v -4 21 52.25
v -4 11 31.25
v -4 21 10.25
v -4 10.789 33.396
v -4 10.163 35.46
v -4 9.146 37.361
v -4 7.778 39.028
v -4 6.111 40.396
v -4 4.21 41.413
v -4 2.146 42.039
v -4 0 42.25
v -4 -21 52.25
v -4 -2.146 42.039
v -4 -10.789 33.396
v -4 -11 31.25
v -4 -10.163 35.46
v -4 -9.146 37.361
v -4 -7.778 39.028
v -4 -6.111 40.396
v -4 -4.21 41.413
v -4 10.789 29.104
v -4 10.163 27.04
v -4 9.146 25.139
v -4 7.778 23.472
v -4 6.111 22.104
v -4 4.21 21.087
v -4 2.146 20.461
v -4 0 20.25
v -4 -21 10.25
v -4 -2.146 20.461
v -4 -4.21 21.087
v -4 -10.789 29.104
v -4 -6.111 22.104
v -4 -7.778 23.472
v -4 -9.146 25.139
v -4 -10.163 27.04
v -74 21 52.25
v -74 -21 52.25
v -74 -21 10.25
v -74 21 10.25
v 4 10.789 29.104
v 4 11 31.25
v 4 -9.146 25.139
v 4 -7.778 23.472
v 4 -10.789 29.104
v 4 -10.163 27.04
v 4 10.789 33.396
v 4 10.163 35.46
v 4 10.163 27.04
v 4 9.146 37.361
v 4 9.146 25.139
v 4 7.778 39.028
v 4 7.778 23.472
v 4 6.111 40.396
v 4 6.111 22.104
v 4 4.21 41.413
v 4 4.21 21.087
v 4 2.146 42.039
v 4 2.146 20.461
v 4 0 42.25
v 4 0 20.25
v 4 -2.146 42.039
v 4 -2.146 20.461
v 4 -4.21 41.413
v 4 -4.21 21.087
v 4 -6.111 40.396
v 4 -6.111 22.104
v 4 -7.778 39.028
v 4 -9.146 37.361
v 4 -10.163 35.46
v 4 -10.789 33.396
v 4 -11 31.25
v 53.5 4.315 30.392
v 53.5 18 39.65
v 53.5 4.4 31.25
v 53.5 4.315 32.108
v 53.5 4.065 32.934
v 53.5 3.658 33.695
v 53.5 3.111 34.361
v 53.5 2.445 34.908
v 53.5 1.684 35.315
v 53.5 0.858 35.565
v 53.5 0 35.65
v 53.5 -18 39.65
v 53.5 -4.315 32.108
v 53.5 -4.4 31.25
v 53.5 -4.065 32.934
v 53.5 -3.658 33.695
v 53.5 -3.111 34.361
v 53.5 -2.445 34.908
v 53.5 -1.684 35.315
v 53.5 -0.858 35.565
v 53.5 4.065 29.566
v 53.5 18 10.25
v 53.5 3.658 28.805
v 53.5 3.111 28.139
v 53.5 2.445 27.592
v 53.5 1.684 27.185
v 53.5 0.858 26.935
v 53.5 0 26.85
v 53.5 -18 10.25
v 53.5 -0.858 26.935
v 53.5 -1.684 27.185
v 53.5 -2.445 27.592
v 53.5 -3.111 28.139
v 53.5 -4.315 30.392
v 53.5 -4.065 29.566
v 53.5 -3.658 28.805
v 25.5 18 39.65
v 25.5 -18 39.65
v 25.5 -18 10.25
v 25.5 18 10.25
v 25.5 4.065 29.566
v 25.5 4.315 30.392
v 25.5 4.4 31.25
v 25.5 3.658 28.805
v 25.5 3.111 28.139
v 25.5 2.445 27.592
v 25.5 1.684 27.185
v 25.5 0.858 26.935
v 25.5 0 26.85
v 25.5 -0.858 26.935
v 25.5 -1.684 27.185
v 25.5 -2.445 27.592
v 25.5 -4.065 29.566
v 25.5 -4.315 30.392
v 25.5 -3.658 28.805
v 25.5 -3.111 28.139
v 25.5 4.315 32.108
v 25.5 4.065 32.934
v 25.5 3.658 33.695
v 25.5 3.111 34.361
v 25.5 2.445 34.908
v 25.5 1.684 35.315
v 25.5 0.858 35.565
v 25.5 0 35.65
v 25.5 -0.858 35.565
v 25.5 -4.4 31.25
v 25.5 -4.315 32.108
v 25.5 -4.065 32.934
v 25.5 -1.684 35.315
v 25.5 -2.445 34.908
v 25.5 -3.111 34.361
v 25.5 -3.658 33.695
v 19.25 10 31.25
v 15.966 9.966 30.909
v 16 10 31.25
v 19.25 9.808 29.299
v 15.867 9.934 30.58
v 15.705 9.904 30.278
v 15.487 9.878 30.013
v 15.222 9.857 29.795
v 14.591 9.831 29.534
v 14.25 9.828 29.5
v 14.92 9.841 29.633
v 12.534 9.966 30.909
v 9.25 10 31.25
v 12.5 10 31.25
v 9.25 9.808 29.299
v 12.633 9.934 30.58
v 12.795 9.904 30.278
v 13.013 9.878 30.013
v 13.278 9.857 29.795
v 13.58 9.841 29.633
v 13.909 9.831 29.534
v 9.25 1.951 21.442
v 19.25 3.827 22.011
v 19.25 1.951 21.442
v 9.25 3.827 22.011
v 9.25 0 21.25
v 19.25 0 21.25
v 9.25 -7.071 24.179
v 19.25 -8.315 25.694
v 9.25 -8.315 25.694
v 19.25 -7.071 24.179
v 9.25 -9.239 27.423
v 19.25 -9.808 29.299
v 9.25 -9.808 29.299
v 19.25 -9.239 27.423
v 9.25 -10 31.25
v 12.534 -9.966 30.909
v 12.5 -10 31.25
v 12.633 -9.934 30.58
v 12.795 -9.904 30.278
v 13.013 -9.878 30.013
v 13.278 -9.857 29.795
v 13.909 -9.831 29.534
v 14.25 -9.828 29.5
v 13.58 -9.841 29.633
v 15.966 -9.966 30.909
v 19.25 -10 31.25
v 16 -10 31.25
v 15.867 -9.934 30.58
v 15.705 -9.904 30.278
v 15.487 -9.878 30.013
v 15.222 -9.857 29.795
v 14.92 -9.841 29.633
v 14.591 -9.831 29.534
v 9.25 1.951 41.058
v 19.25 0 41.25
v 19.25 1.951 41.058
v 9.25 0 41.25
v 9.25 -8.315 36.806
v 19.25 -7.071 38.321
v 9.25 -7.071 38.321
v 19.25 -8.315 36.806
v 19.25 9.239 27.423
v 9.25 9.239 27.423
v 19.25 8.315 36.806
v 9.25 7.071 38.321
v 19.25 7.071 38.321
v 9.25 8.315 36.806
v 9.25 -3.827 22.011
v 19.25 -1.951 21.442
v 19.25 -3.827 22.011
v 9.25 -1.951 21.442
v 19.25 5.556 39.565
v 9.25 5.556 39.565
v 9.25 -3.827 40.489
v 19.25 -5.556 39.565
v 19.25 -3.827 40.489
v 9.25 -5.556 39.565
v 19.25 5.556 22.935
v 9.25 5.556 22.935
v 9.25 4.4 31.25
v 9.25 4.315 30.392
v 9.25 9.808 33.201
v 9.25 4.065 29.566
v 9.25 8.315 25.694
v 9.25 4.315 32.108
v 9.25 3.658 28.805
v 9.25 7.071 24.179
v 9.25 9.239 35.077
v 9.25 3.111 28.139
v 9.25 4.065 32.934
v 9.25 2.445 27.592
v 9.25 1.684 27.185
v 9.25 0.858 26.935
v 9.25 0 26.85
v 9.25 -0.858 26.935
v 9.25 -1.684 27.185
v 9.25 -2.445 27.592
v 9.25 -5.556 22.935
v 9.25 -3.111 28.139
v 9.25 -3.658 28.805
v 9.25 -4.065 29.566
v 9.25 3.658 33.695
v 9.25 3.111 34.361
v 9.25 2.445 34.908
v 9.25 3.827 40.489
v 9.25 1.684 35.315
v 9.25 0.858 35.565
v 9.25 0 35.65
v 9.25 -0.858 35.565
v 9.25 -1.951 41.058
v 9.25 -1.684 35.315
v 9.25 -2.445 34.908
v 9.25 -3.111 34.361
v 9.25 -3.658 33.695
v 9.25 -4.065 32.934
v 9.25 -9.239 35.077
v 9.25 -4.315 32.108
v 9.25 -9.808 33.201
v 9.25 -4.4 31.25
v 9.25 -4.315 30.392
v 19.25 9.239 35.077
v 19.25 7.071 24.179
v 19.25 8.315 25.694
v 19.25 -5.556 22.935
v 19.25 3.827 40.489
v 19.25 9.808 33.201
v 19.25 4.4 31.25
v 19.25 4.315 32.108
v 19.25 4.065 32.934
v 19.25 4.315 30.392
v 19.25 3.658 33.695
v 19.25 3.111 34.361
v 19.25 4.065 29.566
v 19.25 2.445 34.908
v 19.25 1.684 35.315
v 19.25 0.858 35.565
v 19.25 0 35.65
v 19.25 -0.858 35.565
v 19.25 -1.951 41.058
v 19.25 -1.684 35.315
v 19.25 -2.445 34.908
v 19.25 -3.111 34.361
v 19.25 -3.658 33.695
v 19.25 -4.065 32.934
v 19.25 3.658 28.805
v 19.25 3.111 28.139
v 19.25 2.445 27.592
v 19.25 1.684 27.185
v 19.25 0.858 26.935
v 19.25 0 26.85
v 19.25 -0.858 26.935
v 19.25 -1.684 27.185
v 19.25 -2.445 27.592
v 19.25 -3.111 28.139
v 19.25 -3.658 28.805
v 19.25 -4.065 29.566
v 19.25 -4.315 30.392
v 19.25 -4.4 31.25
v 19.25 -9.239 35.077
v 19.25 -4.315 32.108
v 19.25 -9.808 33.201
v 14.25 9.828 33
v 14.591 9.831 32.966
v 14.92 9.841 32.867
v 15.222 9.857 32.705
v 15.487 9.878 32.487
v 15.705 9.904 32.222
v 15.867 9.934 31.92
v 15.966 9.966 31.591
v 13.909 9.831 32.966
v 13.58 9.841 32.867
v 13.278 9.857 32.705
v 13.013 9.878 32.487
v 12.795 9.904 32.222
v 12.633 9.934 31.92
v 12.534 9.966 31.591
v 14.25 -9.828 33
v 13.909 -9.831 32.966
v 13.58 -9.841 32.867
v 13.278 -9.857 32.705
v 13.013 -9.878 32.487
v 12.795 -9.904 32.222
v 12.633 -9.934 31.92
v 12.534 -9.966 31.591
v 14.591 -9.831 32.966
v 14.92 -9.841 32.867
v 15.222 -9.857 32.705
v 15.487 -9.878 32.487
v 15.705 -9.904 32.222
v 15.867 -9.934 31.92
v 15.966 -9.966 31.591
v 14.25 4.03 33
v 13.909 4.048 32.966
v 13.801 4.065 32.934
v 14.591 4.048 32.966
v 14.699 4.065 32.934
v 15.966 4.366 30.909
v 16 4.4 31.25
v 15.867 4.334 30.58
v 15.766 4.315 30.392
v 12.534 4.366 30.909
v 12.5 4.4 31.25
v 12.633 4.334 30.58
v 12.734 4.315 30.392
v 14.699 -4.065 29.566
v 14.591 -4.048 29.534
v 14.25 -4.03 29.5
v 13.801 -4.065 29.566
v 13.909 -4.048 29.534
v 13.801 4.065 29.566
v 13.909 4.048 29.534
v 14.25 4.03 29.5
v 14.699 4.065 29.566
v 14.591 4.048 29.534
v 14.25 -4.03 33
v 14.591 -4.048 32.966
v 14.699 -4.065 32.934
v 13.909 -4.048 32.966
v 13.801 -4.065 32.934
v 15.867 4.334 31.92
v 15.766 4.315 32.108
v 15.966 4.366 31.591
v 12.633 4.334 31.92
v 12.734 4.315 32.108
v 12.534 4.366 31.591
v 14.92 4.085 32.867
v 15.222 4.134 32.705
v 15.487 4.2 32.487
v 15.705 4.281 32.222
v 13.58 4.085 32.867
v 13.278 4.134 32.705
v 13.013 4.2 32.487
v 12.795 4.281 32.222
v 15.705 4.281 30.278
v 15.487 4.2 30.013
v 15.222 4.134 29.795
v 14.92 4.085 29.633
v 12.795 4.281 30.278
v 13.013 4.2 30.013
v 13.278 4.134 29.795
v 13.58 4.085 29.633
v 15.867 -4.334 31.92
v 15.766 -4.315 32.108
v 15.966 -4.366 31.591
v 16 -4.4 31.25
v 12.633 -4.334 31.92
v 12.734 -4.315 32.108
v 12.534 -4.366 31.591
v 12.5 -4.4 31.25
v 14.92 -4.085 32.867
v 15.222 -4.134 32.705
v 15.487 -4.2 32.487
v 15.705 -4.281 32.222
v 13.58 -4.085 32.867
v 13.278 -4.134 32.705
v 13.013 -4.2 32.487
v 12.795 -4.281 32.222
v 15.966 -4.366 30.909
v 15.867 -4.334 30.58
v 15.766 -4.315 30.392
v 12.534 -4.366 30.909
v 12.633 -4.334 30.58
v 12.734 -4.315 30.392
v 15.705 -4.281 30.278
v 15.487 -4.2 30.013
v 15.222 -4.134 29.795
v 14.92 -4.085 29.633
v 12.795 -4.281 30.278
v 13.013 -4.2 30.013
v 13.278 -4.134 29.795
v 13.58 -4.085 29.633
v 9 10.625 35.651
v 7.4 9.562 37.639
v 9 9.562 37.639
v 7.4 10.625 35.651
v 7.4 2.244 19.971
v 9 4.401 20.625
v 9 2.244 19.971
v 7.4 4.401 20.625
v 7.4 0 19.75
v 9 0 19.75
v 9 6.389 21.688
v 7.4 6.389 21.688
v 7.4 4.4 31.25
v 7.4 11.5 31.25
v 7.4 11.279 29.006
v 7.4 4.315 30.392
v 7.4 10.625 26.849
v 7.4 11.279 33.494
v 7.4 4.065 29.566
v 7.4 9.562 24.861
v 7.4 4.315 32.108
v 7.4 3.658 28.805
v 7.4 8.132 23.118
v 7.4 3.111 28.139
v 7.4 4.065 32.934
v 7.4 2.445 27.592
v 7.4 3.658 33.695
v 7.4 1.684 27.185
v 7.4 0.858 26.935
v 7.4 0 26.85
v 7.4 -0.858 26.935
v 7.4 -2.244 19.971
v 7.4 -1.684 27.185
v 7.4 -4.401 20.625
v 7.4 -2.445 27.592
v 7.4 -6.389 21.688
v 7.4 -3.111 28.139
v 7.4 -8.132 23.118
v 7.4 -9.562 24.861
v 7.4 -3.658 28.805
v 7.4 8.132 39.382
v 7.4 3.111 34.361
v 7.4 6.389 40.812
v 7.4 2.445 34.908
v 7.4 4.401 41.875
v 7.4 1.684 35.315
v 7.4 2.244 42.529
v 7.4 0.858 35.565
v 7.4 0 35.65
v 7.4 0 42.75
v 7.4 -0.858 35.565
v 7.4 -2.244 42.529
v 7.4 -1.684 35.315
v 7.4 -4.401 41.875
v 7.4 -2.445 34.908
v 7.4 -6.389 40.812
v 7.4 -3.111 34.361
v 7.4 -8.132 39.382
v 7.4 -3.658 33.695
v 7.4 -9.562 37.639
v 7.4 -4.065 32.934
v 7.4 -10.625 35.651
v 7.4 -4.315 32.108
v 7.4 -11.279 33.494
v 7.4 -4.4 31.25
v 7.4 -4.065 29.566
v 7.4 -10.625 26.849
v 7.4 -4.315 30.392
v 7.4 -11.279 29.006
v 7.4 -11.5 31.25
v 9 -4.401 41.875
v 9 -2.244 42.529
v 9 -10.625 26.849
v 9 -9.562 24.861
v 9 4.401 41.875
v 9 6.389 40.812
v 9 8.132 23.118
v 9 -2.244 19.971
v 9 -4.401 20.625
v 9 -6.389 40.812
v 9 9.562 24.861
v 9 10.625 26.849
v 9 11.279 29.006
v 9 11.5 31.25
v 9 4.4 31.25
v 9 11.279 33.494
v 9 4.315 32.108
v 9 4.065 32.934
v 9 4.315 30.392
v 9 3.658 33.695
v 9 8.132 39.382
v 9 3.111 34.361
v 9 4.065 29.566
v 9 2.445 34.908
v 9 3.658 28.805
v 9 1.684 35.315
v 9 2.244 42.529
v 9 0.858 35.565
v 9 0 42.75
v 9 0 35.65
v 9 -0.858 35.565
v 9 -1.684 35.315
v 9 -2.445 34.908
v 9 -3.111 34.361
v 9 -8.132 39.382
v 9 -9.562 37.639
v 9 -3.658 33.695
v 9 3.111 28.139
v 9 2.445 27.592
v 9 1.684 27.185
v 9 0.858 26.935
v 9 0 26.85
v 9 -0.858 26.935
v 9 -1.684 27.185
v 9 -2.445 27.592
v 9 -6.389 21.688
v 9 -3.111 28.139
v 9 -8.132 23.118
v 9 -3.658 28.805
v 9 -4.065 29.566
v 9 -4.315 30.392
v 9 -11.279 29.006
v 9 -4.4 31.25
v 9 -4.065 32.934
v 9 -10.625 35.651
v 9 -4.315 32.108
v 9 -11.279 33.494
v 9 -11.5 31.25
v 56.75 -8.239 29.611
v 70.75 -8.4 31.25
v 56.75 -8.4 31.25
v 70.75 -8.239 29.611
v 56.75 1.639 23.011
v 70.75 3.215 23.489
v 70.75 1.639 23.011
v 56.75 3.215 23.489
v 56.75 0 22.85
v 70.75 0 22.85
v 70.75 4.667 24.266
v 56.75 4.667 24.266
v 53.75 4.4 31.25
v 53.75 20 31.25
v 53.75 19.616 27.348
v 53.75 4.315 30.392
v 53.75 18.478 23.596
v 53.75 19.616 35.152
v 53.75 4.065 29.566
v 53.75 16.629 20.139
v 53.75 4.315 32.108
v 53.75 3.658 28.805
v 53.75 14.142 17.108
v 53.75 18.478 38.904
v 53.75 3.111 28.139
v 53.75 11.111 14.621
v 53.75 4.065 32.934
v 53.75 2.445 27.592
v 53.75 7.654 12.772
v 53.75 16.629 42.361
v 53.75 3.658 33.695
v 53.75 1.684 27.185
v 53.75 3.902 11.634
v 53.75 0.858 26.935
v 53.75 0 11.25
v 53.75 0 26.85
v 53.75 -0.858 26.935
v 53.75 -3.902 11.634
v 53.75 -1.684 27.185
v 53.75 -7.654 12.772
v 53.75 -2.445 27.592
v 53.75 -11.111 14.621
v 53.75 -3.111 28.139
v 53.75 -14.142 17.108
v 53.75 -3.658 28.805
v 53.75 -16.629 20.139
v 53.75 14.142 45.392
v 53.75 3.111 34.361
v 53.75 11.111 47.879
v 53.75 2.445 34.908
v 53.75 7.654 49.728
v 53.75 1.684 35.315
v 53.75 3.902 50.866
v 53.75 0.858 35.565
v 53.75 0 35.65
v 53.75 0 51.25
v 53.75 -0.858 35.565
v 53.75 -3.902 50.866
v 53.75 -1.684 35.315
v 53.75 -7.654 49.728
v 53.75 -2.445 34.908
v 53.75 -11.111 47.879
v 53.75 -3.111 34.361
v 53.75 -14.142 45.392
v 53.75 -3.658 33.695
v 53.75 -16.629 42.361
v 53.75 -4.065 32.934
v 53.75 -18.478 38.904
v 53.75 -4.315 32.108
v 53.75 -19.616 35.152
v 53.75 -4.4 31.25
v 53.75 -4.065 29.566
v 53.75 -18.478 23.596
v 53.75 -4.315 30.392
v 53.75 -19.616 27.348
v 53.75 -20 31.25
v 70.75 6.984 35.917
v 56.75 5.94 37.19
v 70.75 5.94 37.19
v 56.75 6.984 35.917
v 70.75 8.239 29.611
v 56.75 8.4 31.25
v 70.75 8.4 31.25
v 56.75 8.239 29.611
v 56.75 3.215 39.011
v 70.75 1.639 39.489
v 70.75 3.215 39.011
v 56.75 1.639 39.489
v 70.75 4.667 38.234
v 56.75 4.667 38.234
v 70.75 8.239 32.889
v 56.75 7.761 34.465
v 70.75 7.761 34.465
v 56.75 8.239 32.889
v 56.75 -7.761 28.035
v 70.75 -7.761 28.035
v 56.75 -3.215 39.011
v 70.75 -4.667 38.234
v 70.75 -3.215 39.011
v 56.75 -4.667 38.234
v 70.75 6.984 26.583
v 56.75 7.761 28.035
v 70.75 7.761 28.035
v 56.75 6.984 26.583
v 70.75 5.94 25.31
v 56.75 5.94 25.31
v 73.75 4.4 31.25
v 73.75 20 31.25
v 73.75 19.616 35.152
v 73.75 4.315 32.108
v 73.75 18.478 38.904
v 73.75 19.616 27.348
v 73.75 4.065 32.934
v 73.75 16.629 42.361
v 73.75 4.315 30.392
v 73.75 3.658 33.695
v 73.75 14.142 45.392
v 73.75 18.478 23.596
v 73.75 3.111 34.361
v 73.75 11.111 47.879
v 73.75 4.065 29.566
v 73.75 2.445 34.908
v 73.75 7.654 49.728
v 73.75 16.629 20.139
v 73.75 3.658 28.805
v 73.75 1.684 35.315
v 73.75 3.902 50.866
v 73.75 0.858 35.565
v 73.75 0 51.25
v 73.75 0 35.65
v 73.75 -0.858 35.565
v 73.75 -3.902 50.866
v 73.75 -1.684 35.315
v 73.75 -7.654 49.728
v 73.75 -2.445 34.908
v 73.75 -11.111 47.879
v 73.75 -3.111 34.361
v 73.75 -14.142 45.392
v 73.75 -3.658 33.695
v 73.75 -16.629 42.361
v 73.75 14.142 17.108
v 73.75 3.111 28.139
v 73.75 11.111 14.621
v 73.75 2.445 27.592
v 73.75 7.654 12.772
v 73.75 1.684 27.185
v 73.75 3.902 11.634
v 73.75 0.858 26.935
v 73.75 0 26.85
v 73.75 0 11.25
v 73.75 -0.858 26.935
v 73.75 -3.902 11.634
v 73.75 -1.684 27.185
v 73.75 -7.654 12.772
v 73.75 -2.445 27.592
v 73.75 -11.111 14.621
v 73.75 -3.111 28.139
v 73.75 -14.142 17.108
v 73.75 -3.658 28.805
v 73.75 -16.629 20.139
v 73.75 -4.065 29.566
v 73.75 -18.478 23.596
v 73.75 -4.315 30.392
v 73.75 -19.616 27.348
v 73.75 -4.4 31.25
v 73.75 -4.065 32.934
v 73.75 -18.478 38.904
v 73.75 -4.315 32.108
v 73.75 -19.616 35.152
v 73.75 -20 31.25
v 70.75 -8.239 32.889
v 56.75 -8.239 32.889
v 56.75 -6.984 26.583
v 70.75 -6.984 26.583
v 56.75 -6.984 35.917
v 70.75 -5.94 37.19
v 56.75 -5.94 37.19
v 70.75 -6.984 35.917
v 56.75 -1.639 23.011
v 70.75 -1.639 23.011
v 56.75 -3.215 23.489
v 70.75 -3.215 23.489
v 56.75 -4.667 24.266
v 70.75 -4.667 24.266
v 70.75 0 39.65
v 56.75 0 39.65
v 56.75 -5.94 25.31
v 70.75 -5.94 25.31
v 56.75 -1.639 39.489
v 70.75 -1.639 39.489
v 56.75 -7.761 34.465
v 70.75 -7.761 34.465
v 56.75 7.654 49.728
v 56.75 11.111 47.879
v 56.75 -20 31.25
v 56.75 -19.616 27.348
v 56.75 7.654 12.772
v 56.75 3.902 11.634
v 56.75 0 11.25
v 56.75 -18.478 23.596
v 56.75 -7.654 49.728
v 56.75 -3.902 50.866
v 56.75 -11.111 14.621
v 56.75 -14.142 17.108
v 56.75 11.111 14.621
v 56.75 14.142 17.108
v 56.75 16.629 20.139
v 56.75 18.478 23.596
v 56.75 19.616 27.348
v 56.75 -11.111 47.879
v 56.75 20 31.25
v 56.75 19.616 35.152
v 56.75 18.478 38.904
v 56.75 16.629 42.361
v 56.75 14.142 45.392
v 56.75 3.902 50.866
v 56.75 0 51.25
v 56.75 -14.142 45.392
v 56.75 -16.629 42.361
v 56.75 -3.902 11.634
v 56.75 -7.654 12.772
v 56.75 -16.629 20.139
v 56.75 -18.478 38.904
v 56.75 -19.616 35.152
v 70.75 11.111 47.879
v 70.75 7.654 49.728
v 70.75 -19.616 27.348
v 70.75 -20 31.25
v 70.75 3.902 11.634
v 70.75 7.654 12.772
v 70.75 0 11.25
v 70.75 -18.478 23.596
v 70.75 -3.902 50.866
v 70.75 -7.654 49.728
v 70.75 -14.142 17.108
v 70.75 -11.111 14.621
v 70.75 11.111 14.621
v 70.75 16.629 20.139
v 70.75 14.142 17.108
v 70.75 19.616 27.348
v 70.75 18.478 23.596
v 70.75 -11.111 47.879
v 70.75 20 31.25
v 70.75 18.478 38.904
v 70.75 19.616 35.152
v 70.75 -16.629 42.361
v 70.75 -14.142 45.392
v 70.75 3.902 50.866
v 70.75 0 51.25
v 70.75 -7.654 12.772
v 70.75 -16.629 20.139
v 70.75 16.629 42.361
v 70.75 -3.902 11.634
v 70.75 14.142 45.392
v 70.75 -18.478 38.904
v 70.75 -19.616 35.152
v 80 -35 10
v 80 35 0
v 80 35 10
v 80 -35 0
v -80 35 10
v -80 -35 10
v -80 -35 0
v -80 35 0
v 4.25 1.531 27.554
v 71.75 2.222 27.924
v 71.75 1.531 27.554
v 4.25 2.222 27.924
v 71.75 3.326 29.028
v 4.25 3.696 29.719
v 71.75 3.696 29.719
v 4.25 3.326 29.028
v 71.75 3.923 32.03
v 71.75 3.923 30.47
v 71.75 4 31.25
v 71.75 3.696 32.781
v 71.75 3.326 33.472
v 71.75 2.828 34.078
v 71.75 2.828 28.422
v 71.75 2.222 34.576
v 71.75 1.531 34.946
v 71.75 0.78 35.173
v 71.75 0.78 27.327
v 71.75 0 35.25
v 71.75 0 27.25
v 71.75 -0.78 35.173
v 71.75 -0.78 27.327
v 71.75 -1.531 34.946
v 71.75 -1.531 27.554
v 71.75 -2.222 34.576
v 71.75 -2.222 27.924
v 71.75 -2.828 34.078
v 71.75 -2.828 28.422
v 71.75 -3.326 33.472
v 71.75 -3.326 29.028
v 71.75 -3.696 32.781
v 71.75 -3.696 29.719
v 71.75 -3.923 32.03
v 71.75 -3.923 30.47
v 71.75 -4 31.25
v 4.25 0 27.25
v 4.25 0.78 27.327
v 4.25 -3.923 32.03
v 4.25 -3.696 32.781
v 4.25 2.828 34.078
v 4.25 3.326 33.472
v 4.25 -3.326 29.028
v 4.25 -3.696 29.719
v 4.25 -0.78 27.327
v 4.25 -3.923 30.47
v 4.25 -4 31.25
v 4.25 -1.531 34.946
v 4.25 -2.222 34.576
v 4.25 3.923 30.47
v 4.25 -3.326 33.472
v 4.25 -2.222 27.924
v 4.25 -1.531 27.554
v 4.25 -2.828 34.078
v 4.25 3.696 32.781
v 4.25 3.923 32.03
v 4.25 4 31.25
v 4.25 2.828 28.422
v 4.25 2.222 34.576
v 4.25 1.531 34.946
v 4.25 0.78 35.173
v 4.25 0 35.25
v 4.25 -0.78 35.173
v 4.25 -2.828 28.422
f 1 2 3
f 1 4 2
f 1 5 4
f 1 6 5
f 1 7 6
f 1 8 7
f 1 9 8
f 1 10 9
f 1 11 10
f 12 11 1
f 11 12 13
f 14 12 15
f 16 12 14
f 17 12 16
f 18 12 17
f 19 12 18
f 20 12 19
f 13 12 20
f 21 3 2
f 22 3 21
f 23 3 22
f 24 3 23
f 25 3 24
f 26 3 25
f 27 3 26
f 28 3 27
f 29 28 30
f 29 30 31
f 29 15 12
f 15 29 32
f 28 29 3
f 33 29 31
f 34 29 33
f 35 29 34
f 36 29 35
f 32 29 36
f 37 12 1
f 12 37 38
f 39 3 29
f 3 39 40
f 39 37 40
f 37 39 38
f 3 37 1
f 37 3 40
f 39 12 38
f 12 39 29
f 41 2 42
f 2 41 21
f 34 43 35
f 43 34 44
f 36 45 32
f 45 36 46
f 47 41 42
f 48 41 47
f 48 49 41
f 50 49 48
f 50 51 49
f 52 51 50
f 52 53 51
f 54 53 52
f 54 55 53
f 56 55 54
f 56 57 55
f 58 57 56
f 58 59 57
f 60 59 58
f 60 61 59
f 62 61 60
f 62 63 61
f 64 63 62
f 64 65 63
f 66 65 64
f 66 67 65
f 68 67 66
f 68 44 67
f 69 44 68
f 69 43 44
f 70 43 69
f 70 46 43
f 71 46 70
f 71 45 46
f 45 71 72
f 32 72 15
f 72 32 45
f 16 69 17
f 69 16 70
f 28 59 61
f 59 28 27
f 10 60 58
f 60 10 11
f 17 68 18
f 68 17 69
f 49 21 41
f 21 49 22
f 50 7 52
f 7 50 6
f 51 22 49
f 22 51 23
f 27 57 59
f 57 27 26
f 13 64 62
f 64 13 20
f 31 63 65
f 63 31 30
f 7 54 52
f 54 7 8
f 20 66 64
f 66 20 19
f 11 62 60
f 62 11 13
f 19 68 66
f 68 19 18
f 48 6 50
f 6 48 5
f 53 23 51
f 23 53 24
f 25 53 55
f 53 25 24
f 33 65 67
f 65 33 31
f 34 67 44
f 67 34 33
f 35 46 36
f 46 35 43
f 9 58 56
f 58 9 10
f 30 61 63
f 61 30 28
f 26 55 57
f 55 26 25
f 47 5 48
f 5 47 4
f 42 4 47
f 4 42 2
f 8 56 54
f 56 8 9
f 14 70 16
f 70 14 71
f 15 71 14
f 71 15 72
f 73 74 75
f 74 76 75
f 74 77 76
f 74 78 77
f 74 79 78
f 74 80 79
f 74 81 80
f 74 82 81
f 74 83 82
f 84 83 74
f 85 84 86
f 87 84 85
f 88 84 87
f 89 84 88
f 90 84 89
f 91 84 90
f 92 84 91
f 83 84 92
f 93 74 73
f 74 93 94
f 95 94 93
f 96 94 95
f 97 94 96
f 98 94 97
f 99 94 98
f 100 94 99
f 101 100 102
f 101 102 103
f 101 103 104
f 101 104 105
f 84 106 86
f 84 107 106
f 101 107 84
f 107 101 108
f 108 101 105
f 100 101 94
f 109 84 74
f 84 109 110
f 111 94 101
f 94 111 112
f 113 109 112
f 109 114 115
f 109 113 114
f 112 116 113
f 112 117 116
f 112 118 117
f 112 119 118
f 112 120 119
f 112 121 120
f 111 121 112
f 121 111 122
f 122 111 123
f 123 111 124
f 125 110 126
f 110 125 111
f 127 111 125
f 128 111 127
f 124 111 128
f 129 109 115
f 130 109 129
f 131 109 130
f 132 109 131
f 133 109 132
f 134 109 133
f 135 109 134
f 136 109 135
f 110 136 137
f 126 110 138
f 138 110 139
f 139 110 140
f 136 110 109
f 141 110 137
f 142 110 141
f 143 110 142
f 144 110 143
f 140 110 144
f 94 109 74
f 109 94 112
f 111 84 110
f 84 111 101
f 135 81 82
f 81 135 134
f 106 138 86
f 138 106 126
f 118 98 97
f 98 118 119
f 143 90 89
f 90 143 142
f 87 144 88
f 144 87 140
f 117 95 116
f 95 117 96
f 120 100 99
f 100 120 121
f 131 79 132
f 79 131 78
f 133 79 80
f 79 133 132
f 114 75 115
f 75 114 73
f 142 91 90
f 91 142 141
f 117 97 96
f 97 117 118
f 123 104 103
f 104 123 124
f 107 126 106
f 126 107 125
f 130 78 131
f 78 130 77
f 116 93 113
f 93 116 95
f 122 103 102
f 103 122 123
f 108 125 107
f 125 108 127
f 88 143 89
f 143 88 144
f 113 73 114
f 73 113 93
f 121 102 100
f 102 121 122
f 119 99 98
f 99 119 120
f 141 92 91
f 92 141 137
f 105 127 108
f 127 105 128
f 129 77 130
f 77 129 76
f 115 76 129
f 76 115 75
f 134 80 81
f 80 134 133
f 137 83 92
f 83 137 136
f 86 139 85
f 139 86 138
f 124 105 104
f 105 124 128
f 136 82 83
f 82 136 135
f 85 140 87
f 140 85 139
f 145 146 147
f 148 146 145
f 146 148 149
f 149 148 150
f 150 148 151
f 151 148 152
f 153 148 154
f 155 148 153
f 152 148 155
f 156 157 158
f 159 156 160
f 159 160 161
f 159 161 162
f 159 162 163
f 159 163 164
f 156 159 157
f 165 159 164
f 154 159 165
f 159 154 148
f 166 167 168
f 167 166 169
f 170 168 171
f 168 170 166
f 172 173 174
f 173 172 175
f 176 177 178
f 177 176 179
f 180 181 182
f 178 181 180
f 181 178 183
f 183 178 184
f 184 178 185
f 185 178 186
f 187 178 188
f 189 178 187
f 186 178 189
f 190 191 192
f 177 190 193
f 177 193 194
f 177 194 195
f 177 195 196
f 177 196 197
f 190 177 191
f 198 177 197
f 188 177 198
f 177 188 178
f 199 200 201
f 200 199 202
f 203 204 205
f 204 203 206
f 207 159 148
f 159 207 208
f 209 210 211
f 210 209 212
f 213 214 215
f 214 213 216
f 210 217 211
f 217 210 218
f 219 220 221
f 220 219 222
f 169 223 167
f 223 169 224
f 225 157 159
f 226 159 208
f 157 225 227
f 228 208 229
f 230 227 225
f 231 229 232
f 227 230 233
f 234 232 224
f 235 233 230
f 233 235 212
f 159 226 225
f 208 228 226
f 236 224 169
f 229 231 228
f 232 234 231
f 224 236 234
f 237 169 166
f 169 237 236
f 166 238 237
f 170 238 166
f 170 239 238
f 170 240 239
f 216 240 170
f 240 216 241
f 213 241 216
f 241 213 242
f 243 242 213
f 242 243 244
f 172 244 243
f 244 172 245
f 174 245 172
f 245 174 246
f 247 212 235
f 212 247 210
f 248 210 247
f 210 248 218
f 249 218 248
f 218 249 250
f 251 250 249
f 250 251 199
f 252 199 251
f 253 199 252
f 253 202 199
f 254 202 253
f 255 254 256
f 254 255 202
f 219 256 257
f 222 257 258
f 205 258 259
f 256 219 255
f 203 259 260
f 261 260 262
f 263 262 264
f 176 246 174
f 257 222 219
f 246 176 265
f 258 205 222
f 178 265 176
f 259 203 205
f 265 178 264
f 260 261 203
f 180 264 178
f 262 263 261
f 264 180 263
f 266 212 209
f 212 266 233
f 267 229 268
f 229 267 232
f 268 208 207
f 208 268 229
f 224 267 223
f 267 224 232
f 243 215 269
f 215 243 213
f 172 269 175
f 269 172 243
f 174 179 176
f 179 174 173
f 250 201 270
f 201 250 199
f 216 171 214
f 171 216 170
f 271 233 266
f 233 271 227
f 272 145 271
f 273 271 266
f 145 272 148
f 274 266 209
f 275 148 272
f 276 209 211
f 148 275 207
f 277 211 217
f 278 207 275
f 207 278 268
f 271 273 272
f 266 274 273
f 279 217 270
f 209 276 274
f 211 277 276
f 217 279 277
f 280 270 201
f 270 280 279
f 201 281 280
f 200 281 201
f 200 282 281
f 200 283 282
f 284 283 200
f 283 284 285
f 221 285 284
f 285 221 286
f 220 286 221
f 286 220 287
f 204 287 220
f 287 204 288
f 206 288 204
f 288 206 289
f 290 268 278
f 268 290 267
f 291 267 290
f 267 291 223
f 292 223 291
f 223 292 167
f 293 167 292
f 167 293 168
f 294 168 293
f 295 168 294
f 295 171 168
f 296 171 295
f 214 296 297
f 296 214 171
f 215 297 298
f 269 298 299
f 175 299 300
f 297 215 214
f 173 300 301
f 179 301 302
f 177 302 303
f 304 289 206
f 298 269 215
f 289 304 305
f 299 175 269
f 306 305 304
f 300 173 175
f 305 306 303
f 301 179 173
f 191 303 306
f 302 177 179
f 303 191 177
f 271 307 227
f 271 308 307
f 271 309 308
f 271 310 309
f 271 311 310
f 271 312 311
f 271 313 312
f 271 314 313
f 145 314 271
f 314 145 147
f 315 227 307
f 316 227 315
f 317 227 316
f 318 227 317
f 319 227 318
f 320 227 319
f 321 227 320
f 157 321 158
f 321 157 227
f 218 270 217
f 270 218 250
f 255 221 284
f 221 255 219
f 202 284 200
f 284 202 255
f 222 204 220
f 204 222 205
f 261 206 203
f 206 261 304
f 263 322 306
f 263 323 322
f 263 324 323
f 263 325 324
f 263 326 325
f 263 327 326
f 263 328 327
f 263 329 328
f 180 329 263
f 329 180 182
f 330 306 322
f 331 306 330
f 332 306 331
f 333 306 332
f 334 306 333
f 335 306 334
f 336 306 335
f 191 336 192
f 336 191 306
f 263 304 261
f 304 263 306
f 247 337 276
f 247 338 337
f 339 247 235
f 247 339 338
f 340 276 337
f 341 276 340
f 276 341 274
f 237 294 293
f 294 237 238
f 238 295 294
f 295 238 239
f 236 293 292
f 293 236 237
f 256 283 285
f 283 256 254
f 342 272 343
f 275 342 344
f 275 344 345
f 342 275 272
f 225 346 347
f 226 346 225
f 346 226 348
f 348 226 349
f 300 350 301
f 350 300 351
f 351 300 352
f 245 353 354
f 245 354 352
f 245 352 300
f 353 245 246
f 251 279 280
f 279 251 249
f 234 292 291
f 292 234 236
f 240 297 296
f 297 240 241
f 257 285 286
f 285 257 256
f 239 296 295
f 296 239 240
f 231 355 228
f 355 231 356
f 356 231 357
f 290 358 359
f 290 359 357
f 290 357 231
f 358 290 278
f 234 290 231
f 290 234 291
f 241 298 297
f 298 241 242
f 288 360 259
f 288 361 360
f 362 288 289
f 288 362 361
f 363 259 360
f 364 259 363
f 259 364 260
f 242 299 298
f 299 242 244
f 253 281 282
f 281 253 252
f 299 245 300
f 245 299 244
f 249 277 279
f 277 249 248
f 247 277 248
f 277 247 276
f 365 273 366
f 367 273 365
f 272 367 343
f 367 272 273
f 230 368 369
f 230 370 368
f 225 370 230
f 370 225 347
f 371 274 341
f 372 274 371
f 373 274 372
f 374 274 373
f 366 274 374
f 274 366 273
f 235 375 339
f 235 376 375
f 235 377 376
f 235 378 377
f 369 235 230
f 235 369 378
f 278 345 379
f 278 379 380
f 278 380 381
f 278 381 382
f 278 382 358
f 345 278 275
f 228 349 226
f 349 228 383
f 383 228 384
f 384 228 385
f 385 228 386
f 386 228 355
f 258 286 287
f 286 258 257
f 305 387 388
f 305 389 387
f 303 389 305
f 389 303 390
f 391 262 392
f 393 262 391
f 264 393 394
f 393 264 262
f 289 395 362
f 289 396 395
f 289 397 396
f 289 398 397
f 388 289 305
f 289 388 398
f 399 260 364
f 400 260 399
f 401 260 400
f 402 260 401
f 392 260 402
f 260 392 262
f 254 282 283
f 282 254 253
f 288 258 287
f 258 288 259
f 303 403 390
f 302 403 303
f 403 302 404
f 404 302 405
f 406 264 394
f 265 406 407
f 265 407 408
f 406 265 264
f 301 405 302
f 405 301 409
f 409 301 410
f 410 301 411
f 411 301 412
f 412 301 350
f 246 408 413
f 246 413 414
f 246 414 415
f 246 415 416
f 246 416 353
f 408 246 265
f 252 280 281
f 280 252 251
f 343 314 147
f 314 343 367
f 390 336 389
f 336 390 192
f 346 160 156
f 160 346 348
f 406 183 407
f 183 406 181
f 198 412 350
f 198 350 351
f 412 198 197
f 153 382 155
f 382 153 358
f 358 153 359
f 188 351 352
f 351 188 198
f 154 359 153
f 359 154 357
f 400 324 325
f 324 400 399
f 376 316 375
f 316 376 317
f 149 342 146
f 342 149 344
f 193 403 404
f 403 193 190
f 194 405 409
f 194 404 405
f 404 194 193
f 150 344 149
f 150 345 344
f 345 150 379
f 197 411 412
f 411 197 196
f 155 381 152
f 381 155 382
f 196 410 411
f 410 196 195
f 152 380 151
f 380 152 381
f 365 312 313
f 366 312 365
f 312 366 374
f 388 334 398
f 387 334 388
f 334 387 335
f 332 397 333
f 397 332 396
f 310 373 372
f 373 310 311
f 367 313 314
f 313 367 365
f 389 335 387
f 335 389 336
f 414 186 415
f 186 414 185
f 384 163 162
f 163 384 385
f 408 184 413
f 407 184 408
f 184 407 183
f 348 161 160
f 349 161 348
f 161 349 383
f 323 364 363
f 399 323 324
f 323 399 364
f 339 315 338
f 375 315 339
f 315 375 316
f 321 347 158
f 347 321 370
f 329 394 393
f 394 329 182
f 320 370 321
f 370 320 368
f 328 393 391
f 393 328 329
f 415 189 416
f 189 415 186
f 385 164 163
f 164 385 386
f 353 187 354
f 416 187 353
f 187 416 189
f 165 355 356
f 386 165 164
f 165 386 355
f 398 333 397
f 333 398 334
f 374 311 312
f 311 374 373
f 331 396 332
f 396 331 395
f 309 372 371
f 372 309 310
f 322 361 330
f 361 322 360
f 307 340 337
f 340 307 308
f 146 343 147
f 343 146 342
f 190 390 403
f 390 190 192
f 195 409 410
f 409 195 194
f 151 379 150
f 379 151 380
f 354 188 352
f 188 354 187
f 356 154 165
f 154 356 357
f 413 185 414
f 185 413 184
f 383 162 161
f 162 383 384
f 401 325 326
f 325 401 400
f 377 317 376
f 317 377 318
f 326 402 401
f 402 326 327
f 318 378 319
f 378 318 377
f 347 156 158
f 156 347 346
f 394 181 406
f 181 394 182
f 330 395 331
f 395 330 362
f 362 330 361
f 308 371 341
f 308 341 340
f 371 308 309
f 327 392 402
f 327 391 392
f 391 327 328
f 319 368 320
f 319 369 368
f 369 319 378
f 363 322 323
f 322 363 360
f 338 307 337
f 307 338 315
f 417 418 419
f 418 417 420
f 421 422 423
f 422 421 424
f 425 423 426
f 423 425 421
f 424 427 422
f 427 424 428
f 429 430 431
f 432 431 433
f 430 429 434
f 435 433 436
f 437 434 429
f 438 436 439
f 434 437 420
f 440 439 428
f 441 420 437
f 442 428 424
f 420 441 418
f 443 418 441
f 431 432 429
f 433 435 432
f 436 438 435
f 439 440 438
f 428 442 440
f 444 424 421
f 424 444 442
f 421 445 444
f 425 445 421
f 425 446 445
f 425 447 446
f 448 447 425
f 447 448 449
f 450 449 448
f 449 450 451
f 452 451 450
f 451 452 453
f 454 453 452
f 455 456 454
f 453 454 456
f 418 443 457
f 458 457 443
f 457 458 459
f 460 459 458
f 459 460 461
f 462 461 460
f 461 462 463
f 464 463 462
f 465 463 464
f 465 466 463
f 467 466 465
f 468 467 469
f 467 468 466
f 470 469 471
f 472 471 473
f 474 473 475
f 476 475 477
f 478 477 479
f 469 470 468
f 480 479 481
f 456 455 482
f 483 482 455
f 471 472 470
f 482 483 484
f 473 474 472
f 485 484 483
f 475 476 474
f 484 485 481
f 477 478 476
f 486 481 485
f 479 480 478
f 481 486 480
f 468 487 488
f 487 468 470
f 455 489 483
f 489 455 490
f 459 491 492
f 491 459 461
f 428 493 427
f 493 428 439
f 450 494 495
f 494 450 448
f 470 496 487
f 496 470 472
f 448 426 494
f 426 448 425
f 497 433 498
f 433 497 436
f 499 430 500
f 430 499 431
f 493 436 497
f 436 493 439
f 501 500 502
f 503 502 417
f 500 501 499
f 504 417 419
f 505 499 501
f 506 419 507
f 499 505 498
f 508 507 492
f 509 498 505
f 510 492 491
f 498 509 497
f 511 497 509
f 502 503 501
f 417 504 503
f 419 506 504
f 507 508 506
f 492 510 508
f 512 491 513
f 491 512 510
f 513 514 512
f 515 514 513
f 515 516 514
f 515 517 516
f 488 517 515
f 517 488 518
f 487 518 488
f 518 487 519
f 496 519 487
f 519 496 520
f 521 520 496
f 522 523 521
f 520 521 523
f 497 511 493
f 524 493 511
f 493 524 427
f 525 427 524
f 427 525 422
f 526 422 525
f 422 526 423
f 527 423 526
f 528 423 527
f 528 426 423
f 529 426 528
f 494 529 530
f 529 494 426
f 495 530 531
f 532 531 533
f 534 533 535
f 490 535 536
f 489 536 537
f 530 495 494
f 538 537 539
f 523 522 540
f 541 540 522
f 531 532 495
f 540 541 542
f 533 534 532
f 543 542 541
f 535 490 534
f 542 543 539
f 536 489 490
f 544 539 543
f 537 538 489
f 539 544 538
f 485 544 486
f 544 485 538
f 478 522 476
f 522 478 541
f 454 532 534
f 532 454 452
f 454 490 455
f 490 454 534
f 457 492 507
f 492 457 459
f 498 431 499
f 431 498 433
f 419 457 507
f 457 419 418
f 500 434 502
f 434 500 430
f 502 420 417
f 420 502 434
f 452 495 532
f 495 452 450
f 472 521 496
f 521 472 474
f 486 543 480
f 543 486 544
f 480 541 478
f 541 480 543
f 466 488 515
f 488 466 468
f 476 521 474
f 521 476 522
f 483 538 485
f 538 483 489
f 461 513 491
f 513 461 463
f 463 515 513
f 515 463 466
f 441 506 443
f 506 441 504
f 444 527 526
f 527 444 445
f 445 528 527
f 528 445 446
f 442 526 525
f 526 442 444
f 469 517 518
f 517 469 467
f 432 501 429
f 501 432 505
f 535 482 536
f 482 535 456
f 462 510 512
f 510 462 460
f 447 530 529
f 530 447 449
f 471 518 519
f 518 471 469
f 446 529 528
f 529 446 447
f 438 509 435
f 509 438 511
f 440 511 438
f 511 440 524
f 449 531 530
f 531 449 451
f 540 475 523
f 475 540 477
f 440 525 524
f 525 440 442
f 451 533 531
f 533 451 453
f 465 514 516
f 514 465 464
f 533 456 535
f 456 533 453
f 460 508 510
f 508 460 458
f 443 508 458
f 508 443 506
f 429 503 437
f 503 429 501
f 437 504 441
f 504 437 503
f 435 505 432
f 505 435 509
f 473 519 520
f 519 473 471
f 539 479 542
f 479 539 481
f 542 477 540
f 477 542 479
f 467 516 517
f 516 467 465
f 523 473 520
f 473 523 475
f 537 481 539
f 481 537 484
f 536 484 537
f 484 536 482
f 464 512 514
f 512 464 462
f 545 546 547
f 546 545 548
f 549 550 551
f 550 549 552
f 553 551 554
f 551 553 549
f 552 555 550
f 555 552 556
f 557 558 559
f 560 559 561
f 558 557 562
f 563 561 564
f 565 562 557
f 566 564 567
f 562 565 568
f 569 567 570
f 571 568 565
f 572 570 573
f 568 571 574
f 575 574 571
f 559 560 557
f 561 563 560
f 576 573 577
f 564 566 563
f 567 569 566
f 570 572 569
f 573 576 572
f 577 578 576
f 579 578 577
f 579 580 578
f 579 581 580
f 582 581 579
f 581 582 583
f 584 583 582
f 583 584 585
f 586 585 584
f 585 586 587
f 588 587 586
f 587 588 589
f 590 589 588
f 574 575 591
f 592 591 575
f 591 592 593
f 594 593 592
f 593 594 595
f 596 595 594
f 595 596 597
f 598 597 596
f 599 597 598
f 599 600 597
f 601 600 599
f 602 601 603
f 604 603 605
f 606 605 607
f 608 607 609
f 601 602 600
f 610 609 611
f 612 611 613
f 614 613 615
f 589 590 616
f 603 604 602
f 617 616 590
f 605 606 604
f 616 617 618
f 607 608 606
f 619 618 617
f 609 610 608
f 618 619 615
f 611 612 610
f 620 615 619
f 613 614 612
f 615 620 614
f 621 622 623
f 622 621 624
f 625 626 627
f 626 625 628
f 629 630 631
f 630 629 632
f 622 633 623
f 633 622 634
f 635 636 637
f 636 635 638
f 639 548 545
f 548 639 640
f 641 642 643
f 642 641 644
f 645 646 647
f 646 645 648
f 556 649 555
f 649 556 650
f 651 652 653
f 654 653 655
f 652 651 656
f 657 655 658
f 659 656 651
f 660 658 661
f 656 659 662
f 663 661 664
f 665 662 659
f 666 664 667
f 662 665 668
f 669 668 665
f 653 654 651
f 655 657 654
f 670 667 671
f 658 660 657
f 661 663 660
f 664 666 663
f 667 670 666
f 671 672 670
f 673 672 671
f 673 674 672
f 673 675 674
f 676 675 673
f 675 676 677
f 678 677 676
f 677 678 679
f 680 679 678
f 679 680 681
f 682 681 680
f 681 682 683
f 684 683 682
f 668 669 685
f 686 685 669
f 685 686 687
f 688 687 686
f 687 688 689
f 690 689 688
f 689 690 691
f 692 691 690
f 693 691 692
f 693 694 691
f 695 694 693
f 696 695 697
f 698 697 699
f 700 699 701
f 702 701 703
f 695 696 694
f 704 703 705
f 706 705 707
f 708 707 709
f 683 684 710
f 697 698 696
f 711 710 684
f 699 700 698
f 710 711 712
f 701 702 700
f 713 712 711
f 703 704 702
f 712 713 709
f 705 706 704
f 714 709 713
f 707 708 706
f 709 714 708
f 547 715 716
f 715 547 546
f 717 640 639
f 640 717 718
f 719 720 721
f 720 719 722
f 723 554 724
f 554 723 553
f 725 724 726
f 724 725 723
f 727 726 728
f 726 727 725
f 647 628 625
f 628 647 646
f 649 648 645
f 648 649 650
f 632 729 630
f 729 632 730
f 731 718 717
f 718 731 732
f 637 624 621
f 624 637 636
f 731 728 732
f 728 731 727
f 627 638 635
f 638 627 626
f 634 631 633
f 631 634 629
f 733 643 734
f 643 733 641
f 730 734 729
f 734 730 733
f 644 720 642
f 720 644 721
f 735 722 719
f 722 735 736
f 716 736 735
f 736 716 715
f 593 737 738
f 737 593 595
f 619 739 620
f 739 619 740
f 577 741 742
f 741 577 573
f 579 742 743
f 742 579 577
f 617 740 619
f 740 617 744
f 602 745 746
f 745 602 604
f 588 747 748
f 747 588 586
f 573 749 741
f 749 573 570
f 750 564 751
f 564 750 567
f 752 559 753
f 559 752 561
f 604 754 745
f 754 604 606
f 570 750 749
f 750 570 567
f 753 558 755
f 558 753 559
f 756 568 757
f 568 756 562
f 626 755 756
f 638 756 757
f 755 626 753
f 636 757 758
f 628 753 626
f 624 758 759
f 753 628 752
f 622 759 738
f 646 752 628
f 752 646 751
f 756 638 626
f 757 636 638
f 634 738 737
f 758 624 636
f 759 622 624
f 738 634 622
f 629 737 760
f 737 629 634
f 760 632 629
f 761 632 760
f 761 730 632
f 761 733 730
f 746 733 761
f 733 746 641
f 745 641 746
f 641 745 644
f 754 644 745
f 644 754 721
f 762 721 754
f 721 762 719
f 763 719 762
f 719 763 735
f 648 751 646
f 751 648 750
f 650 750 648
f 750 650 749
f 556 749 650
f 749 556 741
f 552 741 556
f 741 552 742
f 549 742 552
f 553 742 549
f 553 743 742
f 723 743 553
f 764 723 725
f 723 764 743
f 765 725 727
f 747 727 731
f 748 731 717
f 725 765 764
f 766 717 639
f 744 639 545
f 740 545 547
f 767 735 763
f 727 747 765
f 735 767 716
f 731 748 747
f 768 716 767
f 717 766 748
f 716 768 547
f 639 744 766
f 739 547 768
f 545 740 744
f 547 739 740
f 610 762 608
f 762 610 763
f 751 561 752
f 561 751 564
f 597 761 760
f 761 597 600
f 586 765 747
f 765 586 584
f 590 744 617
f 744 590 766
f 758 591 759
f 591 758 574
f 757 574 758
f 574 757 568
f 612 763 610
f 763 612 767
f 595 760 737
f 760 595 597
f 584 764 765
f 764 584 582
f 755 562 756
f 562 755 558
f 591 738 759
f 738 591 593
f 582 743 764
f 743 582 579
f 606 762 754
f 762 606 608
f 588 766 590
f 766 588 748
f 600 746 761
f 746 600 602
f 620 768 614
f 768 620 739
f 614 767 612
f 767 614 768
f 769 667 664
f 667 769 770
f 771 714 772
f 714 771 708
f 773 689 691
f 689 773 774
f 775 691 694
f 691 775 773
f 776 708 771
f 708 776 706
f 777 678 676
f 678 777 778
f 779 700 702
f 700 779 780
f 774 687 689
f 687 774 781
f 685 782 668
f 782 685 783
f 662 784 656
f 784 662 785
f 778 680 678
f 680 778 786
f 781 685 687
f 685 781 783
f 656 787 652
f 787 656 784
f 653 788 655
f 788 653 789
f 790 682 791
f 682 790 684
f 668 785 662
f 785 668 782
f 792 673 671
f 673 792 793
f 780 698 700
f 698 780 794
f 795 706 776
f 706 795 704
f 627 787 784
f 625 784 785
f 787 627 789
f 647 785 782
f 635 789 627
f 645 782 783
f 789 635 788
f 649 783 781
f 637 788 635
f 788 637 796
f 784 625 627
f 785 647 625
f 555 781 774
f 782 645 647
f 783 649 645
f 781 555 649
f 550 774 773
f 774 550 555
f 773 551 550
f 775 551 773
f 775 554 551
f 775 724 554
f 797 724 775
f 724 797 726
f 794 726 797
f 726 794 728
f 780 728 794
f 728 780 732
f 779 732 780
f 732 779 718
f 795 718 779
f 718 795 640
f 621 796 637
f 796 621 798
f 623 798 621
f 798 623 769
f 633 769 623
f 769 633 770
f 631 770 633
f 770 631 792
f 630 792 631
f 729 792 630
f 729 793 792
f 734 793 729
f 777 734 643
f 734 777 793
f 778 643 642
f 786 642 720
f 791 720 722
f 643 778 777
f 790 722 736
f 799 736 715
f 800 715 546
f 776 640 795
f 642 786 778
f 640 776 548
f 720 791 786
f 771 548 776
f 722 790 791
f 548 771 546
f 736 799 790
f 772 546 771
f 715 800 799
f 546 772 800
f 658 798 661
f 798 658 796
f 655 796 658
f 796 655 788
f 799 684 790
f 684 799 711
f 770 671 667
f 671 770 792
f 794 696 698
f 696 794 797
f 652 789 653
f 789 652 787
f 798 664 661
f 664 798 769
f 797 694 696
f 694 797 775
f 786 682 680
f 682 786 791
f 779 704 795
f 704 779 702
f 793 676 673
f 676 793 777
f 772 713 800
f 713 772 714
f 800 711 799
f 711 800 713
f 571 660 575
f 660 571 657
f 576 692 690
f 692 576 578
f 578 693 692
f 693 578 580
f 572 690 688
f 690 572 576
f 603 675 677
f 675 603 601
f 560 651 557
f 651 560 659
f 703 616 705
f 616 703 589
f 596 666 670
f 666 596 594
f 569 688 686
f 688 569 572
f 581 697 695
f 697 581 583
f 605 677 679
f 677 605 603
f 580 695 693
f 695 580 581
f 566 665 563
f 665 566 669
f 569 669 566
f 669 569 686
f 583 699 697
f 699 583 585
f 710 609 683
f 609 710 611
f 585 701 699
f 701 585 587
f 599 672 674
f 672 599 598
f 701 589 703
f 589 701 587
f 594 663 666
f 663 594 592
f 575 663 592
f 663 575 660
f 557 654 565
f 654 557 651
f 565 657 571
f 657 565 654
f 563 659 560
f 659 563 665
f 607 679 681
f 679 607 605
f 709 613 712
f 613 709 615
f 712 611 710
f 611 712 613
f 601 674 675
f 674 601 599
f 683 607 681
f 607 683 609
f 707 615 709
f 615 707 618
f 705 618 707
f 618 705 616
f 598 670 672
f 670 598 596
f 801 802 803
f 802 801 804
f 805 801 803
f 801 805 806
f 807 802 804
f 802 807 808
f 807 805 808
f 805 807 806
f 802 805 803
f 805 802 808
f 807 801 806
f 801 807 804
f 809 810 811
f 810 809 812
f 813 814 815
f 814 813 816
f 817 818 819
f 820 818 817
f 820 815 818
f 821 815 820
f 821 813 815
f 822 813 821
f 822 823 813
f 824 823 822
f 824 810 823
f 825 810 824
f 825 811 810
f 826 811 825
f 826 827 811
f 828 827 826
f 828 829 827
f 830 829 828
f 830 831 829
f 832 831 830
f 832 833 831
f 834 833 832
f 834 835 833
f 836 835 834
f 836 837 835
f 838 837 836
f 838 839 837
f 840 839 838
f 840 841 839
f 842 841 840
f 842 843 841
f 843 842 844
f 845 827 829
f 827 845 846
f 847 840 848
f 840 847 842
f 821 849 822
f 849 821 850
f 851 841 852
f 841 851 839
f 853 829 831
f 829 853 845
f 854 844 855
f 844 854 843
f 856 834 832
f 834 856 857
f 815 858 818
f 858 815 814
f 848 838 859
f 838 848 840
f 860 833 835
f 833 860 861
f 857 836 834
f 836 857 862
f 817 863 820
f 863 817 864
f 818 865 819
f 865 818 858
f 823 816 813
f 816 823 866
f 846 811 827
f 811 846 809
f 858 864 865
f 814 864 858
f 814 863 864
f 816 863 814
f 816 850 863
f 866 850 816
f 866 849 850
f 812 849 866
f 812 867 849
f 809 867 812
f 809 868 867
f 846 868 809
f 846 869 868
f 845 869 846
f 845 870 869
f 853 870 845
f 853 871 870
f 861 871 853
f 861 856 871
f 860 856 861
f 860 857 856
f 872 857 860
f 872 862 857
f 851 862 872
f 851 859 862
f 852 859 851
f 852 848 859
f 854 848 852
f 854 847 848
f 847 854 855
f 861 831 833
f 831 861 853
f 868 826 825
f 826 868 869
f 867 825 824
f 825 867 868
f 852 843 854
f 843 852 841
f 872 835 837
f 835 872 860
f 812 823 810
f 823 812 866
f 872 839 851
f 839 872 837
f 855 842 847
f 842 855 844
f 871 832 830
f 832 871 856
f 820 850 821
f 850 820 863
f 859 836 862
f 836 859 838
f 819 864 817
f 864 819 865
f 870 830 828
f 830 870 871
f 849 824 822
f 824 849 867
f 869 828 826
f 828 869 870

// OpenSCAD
$fn = 32;

// ------------------------------------------------------------------------
// Motor drive station: motor 70 x 42 mm, shaft d8, pulley d40
// Every part is its own module, assembly() places every instance.
// ------------------------------------------------------------------------

// --- part 1 ---
module station_bed() {
  difference() {
    translate([-80, -35, 0]) cube([160, 70, 10]);
  }
}

// --- part 2 ---
module drive_motor() {
  union() {
    translate([-35, -21, 0]) cube([70, 42, 42]);
    translate([39, 0, 21]) rotate([0, 90, 0]) cylinder(h = 8, d = 22, center = true);
  }
}

// --- part 3 ---
module pillow_block() {
  difference() {
    translate([-14, -18, 0]) cube([28, 36, 29.4]);
    translate([0, 0, 21]) rotate([0, 90, 0]) cylinder(h = 30, d = 8.8, center = true);
  }
}

// --- part 4 ---
module drive_shaft() {
  translate([0, 0, -33.75]) cylinder(h = 67.5, d = 8);
}

// --- part 5 ---
module shaft_collar() {
  difference() {
    cylinder(h = 10, d = 20);
    translate([0, 0, -1]) cylinder(h = 12, d = 8.8);
    translate([0, 0, 5]) rotate([90, 0, 0]) cylinder(h = 22, d = 3.5, center = true);
  }
}

// --- part 6 ---
module collar_washer() {
  difference() {
      translate([0, 0, 0]) cylinder(h = 1.6, d = 23);
      translate([0, 0, -1]) cylinder(h = 3.6, d = 8.8);
    }
}

// --- part 7 ---
module drive_pulley() {
  difference() {
    union() {
      cylinder(h = 20, d = 16.8);
      cylinder(h = 3, d = 40);
      translate([0, 0, 17]) cylinder(h = 3, d = 40);
    }
    translate([0, 0, -1]) cylinder(h = 22, d = 8.8);
  }
}

// --- assembly ---
module assembly() {
  color([0.80, 0.24, 0.20]) translate([0, 0, 0]) rotate([0, 0, 0]) station_bed();
  color([0.20, 0.45, 0.75]) translate([-39, 0, 10.25]) rotate([0, 0, 0]) drive_motor();
  color([0.25, 0.62, 0.32]) translate([39.5, 0, 10.25]) rotate([0, 0, 0]) pillow_block();
  color([0.92, 0.70, 0.18]) translate([38, 0, 31.25]) rotate([0, 90, 0]) drive_shaft();
  color([0.58, 0.35, 0.70]) translate([9.25, 0, 31.25]) rotate([0, 90, 0]) shaft_collar();
  color([0.16, 0.66, 0.66]) translate([7.4, 0, 31.25]) rotate([0, 90, 0]) collar_washer();
  color([0.85, 0.48, 0.18]) translate([53.75, 0, 31.25]) rotate([0, 90, 0]) drive_pulley();
}

assembly();
